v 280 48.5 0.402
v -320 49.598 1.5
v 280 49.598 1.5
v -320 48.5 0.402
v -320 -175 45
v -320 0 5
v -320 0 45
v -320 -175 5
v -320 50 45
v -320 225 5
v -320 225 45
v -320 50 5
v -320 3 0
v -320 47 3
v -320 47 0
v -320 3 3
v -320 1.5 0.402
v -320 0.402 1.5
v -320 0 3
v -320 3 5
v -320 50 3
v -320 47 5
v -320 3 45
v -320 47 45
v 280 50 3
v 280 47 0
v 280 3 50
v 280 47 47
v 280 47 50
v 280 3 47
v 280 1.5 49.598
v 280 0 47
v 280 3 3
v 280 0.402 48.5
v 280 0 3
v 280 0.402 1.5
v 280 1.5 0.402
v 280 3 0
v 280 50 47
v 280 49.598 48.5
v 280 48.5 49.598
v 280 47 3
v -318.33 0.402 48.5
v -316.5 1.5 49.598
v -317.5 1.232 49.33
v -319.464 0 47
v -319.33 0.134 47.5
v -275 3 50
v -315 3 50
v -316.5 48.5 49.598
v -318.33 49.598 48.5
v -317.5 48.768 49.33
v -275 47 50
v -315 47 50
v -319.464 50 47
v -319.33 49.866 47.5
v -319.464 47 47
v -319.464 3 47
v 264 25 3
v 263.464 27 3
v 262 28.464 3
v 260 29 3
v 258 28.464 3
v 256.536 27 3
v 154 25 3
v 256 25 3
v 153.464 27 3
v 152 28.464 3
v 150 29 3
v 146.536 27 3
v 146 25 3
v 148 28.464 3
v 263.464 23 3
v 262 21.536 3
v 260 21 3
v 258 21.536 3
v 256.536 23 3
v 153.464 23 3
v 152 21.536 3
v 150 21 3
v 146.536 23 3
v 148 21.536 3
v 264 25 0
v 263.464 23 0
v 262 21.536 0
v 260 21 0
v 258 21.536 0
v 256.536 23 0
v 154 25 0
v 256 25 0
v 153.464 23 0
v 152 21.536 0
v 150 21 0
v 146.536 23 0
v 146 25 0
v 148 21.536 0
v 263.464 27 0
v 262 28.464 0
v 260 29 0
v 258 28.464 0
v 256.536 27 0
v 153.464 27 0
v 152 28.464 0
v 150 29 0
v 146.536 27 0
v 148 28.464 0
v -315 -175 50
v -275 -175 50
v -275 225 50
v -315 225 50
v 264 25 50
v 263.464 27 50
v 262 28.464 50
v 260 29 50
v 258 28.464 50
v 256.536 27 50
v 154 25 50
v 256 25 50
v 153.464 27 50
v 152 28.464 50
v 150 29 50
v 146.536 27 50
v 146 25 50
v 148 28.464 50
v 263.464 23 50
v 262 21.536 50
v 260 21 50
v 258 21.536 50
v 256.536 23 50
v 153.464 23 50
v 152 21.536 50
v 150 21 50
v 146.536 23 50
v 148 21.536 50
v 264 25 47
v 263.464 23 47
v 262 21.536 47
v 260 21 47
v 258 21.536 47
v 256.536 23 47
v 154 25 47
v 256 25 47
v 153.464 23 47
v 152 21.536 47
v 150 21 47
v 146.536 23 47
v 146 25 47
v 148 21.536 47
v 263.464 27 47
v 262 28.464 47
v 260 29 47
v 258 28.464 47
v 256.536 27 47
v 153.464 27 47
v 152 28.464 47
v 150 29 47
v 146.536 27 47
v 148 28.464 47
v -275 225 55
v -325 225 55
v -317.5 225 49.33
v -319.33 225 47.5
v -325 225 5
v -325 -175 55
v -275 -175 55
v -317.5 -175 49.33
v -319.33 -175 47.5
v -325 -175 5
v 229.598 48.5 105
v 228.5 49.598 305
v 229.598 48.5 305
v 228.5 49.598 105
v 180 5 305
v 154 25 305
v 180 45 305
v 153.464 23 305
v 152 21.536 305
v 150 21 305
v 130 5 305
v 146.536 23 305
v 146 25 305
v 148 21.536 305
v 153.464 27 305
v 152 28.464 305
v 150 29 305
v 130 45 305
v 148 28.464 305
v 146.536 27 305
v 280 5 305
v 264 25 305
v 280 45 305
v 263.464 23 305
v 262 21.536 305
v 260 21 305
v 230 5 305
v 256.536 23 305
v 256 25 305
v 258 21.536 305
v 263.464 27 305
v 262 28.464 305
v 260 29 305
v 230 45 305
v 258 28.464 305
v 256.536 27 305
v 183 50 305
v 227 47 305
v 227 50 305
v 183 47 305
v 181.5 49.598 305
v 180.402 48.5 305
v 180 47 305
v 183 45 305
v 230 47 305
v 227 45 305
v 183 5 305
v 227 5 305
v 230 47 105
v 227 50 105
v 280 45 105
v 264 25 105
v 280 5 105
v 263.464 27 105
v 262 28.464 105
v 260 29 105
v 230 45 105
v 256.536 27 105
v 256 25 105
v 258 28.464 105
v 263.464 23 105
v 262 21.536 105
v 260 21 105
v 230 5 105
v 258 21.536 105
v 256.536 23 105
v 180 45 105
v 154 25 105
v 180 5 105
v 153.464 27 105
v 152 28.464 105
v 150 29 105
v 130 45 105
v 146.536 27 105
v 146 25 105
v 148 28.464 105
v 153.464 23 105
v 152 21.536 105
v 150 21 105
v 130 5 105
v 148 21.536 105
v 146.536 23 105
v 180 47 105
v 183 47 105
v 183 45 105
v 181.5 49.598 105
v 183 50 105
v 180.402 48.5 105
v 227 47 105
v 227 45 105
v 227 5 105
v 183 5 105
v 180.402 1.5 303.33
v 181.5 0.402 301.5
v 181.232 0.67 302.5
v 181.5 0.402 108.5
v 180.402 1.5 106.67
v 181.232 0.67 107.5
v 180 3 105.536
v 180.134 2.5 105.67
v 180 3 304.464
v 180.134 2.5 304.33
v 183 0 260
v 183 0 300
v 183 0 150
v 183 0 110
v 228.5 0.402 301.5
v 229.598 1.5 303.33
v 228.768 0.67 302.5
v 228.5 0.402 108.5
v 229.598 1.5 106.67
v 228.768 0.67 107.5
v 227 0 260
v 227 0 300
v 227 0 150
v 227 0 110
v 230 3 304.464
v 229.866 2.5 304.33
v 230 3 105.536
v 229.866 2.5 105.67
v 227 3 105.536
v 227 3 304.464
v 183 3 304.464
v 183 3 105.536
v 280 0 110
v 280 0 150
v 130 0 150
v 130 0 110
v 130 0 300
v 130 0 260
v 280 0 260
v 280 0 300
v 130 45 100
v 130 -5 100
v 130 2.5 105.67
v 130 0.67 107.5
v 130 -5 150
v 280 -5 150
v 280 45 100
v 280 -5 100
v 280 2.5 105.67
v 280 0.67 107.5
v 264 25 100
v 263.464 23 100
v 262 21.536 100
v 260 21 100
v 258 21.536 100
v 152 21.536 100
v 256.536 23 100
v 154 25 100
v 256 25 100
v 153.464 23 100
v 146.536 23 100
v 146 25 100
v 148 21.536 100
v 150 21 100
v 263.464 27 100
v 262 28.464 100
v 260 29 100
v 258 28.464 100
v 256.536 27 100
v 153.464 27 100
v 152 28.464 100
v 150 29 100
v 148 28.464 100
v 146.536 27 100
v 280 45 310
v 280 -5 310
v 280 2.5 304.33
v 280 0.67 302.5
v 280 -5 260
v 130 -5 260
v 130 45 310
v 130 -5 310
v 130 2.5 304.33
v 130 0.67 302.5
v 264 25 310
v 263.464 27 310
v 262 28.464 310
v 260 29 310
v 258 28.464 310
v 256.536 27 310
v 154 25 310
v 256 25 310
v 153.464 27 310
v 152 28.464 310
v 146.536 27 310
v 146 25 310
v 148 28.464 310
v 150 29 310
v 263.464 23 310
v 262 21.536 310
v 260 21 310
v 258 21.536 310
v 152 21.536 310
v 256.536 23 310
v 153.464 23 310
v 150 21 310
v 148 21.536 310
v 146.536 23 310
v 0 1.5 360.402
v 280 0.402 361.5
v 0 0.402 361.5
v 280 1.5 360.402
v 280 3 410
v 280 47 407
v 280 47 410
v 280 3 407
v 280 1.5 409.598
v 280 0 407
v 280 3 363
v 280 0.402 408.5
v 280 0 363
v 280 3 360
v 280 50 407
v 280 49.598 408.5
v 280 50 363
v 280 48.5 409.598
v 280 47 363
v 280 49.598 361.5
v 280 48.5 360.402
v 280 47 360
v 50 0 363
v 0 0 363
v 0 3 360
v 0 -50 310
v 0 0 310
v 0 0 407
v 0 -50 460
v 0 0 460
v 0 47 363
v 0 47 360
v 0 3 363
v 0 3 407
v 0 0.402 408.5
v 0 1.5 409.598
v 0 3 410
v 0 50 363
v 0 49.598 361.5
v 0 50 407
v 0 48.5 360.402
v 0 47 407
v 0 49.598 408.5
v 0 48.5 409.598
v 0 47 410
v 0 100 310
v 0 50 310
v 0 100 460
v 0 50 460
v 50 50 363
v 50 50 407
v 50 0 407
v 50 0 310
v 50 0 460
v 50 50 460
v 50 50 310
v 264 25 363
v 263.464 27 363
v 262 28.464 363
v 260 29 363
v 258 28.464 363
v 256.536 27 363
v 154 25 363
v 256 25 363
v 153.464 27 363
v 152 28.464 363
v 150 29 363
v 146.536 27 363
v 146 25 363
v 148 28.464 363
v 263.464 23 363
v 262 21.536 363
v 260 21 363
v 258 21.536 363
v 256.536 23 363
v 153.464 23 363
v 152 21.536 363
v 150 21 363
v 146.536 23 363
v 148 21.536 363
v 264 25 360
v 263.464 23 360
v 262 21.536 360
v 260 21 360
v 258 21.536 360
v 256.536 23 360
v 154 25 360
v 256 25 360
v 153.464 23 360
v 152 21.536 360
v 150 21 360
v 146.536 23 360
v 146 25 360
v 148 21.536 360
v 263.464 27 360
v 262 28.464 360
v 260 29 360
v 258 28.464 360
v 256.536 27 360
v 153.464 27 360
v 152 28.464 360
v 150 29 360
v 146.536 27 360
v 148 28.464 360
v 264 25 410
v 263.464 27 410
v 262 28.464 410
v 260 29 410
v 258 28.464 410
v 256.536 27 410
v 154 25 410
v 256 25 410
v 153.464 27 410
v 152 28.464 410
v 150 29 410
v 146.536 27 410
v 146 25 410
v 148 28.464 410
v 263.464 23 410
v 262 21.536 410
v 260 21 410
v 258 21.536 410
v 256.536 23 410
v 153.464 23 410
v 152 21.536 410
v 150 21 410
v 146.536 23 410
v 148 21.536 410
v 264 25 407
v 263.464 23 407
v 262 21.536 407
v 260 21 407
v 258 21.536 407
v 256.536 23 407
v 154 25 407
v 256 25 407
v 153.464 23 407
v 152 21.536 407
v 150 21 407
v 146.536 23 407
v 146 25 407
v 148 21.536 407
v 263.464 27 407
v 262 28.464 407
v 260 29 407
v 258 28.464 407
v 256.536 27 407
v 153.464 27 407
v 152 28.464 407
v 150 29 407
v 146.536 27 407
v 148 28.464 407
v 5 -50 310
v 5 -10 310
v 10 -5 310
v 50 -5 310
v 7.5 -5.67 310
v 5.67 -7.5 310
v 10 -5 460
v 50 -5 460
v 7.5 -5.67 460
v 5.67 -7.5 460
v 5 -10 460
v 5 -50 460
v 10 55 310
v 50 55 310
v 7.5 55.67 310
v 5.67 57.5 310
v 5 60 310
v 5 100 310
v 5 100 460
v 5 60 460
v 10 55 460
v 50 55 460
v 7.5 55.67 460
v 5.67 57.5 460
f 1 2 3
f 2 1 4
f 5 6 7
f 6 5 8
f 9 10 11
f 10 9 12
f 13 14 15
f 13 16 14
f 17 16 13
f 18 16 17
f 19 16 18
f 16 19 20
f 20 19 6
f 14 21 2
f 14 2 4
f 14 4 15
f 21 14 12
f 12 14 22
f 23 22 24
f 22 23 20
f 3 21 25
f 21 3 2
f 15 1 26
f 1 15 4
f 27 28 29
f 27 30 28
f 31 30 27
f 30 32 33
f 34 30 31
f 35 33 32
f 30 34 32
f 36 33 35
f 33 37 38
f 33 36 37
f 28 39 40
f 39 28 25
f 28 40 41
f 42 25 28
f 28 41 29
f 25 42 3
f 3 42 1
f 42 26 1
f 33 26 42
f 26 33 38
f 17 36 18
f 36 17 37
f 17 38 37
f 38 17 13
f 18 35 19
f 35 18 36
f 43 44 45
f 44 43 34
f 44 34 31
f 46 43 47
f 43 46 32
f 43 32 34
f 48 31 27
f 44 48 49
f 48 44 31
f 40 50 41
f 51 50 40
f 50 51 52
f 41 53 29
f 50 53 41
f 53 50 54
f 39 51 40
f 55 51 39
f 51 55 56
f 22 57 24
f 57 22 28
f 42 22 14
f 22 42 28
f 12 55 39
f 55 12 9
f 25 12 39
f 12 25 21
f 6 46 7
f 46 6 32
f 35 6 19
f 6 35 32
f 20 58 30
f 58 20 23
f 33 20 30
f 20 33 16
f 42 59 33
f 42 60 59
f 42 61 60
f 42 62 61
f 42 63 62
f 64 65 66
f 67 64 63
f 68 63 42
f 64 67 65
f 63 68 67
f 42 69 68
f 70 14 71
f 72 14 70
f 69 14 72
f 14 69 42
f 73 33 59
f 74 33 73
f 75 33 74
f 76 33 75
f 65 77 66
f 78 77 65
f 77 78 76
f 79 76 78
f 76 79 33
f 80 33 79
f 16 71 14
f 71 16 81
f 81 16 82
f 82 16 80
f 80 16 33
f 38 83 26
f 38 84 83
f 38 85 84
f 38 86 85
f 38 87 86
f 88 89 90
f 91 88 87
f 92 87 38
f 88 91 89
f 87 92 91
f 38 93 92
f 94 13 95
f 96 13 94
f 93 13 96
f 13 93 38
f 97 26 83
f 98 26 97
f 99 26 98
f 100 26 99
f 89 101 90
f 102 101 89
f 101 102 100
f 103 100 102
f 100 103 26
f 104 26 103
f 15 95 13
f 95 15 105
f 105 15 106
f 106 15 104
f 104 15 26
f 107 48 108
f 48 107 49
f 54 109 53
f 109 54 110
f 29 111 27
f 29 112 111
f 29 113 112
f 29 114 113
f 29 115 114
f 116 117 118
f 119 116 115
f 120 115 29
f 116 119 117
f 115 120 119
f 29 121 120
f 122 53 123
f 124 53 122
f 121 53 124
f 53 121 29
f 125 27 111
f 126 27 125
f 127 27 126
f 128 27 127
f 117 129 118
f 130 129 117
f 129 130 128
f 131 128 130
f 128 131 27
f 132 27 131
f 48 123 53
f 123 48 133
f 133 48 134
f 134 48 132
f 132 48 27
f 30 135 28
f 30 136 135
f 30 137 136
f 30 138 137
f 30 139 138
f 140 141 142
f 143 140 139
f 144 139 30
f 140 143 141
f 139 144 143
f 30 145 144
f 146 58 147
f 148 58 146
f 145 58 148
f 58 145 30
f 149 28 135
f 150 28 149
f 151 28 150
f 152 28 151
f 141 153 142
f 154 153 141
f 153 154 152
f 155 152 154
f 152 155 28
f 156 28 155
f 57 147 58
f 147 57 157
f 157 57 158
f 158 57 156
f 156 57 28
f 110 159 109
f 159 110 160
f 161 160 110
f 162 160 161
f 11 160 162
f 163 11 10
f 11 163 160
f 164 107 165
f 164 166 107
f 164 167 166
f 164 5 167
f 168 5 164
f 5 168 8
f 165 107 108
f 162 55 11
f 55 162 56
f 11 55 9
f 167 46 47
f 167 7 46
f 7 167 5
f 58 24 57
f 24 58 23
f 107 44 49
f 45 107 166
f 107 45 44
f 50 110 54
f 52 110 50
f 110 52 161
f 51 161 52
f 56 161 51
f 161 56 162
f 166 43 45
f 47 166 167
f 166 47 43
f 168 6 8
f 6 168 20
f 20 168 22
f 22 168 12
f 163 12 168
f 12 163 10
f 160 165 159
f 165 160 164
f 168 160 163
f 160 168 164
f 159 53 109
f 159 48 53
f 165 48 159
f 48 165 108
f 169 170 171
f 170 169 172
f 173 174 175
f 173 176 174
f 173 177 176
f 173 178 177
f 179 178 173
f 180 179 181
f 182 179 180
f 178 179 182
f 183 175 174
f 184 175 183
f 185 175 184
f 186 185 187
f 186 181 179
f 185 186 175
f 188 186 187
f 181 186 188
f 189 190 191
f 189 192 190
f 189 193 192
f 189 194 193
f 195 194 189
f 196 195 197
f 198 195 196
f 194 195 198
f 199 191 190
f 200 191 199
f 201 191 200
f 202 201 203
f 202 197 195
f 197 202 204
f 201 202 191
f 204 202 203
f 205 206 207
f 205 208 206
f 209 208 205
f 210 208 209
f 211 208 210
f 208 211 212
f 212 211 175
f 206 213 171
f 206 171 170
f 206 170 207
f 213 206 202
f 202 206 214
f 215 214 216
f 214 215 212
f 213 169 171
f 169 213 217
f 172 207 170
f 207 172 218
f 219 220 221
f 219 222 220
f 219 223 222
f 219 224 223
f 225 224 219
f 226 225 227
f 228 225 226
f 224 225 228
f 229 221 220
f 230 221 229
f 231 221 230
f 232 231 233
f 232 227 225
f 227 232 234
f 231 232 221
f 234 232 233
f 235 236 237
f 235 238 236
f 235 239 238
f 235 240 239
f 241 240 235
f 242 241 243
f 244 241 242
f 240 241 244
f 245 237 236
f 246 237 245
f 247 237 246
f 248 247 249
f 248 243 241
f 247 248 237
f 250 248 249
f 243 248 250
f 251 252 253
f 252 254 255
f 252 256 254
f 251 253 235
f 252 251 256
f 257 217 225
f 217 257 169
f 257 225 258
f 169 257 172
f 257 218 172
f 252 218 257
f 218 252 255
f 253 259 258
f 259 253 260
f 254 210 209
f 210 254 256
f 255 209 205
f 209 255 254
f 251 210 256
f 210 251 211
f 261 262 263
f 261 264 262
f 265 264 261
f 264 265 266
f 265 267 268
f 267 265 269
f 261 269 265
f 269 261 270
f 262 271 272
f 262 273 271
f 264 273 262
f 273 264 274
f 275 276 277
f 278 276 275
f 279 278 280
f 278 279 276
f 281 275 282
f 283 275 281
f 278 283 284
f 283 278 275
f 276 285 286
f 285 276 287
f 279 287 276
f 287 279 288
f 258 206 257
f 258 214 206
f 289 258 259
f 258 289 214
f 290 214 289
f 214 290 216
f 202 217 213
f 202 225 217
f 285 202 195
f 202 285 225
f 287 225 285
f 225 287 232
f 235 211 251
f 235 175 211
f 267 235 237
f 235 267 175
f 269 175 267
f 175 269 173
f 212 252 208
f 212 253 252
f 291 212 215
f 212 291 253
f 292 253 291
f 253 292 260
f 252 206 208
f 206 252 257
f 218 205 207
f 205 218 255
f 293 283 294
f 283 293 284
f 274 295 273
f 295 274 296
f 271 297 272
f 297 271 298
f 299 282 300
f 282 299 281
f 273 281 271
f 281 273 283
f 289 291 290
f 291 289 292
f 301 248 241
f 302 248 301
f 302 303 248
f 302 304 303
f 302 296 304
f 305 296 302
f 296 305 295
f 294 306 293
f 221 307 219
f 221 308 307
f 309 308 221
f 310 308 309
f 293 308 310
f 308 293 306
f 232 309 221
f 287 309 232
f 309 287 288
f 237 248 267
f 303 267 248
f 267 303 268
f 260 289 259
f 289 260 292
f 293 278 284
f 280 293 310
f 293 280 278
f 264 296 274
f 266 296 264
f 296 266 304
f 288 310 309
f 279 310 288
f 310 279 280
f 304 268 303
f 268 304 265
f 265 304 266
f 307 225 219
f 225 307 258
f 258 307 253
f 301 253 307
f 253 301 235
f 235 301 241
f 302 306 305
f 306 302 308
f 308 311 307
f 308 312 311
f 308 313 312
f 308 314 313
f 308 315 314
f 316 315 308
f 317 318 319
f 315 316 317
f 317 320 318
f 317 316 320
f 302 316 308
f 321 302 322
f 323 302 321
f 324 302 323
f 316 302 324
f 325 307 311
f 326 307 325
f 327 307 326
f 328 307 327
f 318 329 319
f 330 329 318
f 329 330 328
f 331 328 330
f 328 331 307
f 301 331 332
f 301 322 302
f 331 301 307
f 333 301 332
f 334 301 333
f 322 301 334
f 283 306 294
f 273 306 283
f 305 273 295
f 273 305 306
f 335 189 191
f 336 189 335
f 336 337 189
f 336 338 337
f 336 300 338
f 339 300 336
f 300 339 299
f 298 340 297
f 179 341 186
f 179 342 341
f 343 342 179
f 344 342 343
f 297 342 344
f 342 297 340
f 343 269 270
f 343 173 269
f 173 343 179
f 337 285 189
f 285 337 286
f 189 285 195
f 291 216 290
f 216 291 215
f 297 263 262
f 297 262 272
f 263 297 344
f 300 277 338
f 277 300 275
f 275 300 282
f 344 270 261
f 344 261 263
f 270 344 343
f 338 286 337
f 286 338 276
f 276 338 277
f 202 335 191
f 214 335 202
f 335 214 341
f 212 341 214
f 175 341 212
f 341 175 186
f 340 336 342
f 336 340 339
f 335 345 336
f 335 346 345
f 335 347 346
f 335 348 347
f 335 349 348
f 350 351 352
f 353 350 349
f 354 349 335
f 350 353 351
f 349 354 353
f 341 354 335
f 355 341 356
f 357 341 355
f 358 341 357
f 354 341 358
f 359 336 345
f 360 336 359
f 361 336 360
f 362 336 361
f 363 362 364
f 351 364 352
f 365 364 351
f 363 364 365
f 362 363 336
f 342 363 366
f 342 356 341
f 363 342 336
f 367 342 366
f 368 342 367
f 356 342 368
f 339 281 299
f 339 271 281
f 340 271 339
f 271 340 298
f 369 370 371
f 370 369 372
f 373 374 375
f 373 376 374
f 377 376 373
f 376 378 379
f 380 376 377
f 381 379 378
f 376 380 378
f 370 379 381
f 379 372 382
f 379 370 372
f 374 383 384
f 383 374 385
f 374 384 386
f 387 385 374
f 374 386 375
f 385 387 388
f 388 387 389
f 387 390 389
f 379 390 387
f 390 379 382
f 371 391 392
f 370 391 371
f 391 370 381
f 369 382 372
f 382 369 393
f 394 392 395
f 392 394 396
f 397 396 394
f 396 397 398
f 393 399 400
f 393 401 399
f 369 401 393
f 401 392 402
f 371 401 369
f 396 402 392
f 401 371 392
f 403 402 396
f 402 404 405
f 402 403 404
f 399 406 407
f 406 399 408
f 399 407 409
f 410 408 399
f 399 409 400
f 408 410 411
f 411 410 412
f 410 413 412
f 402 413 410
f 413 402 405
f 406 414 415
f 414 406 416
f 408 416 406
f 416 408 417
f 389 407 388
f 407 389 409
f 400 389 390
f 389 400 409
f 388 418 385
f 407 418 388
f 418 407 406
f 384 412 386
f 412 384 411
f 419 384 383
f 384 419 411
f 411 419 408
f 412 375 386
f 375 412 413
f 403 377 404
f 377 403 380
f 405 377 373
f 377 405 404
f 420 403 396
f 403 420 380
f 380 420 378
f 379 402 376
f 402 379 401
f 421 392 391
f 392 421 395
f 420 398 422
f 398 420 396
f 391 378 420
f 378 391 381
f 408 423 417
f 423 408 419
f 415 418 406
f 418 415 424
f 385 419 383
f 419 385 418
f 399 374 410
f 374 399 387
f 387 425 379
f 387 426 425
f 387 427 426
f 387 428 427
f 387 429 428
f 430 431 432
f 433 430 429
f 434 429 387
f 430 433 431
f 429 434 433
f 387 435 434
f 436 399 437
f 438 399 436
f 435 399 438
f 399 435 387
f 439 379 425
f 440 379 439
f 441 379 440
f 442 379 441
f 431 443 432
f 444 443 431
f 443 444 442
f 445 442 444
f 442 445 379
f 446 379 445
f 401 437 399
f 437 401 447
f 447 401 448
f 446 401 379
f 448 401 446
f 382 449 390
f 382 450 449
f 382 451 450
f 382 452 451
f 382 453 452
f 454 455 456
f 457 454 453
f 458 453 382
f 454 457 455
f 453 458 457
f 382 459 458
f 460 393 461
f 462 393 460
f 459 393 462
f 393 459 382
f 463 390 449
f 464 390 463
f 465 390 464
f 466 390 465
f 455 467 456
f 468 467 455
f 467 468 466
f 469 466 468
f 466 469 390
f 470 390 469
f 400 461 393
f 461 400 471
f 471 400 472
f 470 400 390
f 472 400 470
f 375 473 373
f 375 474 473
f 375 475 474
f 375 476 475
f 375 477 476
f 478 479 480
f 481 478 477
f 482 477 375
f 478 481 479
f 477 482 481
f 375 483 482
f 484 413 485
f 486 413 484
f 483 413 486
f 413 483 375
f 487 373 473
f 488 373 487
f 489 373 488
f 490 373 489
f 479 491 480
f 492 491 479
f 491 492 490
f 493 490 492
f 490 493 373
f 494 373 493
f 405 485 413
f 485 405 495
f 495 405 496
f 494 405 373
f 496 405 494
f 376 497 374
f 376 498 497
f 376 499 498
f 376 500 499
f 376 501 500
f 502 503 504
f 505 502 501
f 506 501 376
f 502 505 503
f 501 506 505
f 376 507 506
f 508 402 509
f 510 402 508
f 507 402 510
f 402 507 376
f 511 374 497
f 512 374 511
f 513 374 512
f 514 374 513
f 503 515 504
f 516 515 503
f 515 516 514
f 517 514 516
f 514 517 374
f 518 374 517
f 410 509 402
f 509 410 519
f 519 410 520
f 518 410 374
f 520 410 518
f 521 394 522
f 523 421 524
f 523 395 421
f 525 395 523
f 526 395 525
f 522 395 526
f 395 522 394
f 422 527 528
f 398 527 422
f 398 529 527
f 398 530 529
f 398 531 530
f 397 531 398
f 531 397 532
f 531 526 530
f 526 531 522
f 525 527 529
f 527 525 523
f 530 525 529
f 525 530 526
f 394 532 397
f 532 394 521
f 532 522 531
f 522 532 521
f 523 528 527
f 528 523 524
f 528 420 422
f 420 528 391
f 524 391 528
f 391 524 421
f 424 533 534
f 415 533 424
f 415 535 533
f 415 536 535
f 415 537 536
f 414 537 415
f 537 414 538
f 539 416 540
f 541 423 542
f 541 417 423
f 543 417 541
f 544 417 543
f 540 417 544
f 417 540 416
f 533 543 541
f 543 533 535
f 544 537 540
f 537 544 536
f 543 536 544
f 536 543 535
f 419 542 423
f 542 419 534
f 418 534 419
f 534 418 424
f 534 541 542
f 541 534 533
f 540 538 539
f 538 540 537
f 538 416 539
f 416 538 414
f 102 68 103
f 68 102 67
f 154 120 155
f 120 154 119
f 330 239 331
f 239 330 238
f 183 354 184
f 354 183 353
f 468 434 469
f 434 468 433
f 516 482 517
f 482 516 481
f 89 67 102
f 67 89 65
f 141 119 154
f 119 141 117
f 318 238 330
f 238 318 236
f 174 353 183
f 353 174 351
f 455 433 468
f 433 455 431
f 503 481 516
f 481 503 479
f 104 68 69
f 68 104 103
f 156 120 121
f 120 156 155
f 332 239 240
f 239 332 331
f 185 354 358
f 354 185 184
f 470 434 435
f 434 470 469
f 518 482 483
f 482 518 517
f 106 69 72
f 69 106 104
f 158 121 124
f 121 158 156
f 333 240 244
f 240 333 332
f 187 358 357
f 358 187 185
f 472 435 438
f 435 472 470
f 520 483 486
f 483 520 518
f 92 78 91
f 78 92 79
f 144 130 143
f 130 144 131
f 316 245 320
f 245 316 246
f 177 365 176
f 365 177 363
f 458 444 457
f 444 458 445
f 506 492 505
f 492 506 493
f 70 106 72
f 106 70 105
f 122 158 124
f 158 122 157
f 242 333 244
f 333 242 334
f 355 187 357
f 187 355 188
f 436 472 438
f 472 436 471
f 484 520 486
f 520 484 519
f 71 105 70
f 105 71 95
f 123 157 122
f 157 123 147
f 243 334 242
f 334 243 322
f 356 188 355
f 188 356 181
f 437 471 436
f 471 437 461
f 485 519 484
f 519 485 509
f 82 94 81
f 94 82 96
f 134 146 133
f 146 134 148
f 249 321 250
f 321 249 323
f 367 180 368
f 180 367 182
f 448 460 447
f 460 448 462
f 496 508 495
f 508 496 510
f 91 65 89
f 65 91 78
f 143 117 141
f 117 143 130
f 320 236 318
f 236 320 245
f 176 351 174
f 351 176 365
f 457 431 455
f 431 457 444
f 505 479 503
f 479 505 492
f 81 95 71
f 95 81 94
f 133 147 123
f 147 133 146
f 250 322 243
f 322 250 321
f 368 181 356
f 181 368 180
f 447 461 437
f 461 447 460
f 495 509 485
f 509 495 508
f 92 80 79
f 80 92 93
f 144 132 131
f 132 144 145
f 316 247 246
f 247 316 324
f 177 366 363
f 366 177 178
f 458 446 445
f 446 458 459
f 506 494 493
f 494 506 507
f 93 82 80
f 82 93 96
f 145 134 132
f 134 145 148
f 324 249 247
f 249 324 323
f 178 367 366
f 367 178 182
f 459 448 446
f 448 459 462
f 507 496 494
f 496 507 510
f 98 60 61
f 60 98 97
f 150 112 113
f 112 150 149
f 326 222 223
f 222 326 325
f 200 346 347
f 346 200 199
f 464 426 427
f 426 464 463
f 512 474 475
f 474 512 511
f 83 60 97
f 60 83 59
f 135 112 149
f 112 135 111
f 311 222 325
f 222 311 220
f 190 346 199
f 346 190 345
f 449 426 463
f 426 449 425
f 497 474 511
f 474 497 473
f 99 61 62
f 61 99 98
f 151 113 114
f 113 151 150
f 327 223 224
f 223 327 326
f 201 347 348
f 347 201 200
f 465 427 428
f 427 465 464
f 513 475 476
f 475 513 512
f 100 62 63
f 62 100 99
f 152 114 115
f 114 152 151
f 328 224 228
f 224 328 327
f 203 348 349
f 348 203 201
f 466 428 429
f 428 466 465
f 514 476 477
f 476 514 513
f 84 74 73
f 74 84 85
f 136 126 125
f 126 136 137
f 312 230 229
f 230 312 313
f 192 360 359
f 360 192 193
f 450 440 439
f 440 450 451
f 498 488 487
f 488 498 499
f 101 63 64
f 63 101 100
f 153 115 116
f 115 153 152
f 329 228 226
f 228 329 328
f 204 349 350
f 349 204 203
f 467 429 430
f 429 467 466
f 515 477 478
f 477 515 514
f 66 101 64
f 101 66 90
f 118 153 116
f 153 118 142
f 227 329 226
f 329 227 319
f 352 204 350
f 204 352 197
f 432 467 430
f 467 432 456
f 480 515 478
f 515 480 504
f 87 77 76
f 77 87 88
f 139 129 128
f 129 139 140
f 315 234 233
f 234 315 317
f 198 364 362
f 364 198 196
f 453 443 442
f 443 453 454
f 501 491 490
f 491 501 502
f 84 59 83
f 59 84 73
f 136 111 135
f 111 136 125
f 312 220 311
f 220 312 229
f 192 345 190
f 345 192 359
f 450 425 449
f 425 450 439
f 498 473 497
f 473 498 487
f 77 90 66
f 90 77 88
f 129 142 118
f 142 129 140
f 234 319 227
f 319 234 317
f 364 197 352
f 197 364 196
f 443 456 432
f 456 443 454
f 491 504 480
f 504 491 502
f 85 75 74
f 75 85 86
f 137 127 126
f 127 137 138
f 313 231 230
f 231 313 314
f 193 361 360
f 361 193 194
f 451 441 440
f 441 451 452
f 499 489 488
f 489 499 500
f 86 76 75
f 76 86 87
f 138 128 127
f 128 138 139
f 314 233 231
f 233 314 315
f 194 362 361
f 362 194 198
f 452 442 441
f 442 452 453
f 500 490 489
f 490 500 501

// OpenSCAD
// file: steel_profile.scad
module arc (r_inner, r_outer, l) {
		intersection() {
			rotate([0, 90, 0])
			difference(){
				cylinder(d=2*r_outer, h=l);
				cylinder(d=2*r_inner, h=l);
			}
			translate([0, -r_outer, -r_outer])
			cube([l, r_outer, r_outer]);
		}
}

/*****************
	Уголок профильный:
	s - толщина полки
	h - одна полка
	w - вторая полка
	l - длинна
	r - внутренний радиус закругления
******************/

module profile_L (s, h, w, l, r) {
	union() {
		translate([0, r+s, r+s])
		arc(r, r+s, l);
		cube([l, s, h]);
		cube([l, w, s]);
	}
}

// profile_L(5, 20, 50, 300, 6);


/***********************
	Труба профильная прямоугольная:
	s - толщина стенки
	h - толщина трубы 
	w - толщина трубы вторая
	l - длинна
	r - внешний радиус закругления
************************/

module profile_pipe (s, h, w, l, r) {
	union () {
		translate([0, r, r])
		arc(r-s, r, l);

		translate([0, w-r, r])
		rotate([90, 0, 0])
		arc(r-s, r, l);

		translate([0, w-r, h-r])
		rotate([180, 0, 0])
		arc(r-s, r, l);

		translate([0, r, h-r])
		rotate([270, 0, 0])
		arc(r-s, r, l);

		translate([0, 0, r])
		cube([l, s, h-2*r]);

		translate([0, w-s, r])
		cube([l, s, h-2*r]);

		translate([0, r, 0])
		cube([l, w-2*r, s]);

		translate([0, r, h-s])
		cube([l, w-2*r, s]);
	}
}

//profile_pipe(3, 50, 30, 300, 4);


/***************************
	Швеллер:
	s - толщина стенок
	w - ширина
	h - высота полок
	l - длина
	r - внутренний радиус
****************************/


module channel (s, w, h, l, r) {
	union () {	
		translate([0, r+s, r+s])
		arc(r, r+s, l);

		translate([0, w-(r+s), r+s])
		rotate([90, 0, 0])
		arc(r, r+s, l);

		translate([0, 0, r])
		cube([l, s, h]);

		translate([0, w-s, r])
		cube([l, s, h]);

		cube([l, w, s]);
	}
}

//channel(3, 50, 30, 300, 3);




/***************************
	Двутавр:
	s - толщина стенок
	h - высота
	w - ширина полок
	l - длина
	r - внутренний радиус
****************************/

module I_beam (s, h, w, l, r) {
	union () {

		translate([0, -s, r+s])
		rotate([90, 0, 0])
		arc(r, r+s, l);

		translate([0, r+s, r+s])
		rotate([0, 0, 0])
		arc(r, r+s, l);


		translate([0, -s, h-r-s])
		rotate([180, 0, 0])
		arc(r, r+s, l);

		translate([0, r+s, h-r-s])
		rotate([270, 0, 0])
		arc(r, r+s, l);

		cube([l, s, h]);
		
		translate([0, -w/2+s/2, h-s])
		cube([l, w, s]);

		translate([0, -w/2+s/2, 0])
		cube([l, w, s]);
	}
}

//I_beam(3, 50, 30, 300, 3);
// main file
$fn=12;


use <steel_profile.scad>;

module arc (r_inner, r_outer, l) {
		intersection() {
			rotate([0, 90, 0])
			difference(){
				cylinder(d=2*r_outer, h=l);
				cylinder(d=2*r_inner, h=l);
			}
			translate([0, -r_outer, -r_outer])
			cube([l, r_outer, r_outer]);
		}
}

/*****************
	Уголок профильный:
	s - толщина полки
	h - одна полка
	w - вторая полка
	l - длинна
	r - внутренний радиус закругления
******************/

module profile_L (s, h, w, l, r) {
	union() {
		translate([0, r+s, r+s])
		arc(r, r+s, l);
		cube([l, s, h]);
		cube([l, w, s]);
	}
}

// profile_L(5, 20, 50, 300, 6);


/***********************
	Труба профильная прямоугольная:
	s - толщина стенки
	h - толщина трубы 
	w - толщина трубы вторая
	l - длинна
	r - внешний радиус закругления
************************/

module profile_pipe (s, h, w, l, r) {
	union () {
		translate([0, r, r])
		arc(r-s, r, l);

		translate([0, w-r, r])
		rotate([90, 0, 0])
		arc(r-s, r, l);

		translate([0, w-r, h-r])
		rotate([180, 0, 0])
		arc(r-s, r, l);

		translate([0, r, h-r])
		rotate([270, 0, 0])
		arc(r-s, r, l);

		translate([0, 0, r])
		cube([l, s, h-2*r]);

		translate([0, w-s, r])
		cube([l, s, h-2*r]);

		translate([0, r, 0])
		cube([l, w-2*r, s]);

		translate([0, r, h-s])
		cube([l, w-2*r, s]);
	}
}

//profile_pipe(3, 50, 30, 300, 4);


/*************************
	Используемые профили:
	- труба квадратная 50x50x3
	- уголок равнополочный 50x50x5
**************************/

pipe_w = 50;
pipe_s = 3;
pipe_r = 3;
L_w = 50;
L_s = 5;
L_r = 5;

module L (l) {
	profile_L(L_s, L_w, L_w, l, L_r);
}

module pipe (l) {
	profile_pipe(pipe_s, pipe_w, pipe_w, l, pipe_r);
}

/********************
	Размеры
*********************/

work_area_x = 200;
work_area_y = 200;
operation_area_x = 2*work_area_x;
operation_area_y = 2*work_area_y;
mount_width = 150;
vertical_height = 150;
mill_mount_w = 70;
arrow_len = work_area_x - mill_mount_w;


/********************
	Элементы конструкции:
	- base - основание
	- column - колонна
	- arrow - вылет для крепления
*********************/

module I (l, w1, w2) {
	pipe(l);

	translate([-L_s, -(w1/2 - pipe_w/2), pipe_w+L_s])
	rotate([0, 180, -90])
	L(w1);

	translate([l + L_s, w2/2 + pipe_w/2, pipe_w+L_s])
	rotate([0, 180, 90])
	L(w2);
}


module II (l, w1, w2, dw) {
	translate([0, dw/2 + pipe_w/2, 0])
	pipe(l);

	translate([0, -(dw/2 + pipe_w/2), 0])
	pipe(l);

	translate([-L_s, -(w1/2 - pipe_w/2), pipe_w+L_s])
	rotate([0, 180, -90])
	L(w1);

	translate([l + L_s, w2/2 + pipe_w/2, pipe_w+L_s])
	rotate([0, 180, 90])
	L(w2);
}

// полная длинна основания: 400 + 150 + 50 = 600
base_length = operation_area_x + mount_width + L_w;

module base() {
	pipe(base_length);

	translate([base_length + L_s, (operation_area_y + pipe_w)/2, pipe_w+L_s])
	rotate([0, 180, 90])
	L(operation_area_y);
}

col_h = vertical_height + (mount_width-pipe_w)/2;

module column() {
	translate([0, 0, L_s])
	rotate([0, -90, 90])
//	II(col_h, mount_width, mount_width, mount_width - 2*pipe_w - 2*35);
	I(col_h, mount_width, mount_width);
}

// полная высота колонны с креплениями
column_height = col_h + 2*L_s;


module arrow () {
	pipe(arrow_len + mount_width);

	translate([0, 0, (mount_width + pipe_w)/2])
	rotate([0, 90, 270])
	L(mount_width);

	translate([0, pipe_w, (mount_width + pipe_w)/2])
	rotate([0, 90, 0])
	L(mount_width);
}

/******************
	Сборка с отверстиями
*******************/

difference() {
	union () {
		translate([arrow_len + mount_width, pipe_w, 0])
		rotate([0, 0, 180])
		base();

		translate([arrow_len + (mount_width + pipe_w)/2, pipe_w, pipe_w + 50])
		column();

		translate([0, 0, column_height + pipe_w + 100])
		arrow();
	}
	union() {
		translate([arrow_len + 20, L_w/2, -column_height])
		cylinder(d=8, h=7*column_height, center=true);

		translate([arrow_len + mount_width - 20, L_w/2, -column_height])
		cylinder(d=8, h=7*column_height, center=true);




	}
}
